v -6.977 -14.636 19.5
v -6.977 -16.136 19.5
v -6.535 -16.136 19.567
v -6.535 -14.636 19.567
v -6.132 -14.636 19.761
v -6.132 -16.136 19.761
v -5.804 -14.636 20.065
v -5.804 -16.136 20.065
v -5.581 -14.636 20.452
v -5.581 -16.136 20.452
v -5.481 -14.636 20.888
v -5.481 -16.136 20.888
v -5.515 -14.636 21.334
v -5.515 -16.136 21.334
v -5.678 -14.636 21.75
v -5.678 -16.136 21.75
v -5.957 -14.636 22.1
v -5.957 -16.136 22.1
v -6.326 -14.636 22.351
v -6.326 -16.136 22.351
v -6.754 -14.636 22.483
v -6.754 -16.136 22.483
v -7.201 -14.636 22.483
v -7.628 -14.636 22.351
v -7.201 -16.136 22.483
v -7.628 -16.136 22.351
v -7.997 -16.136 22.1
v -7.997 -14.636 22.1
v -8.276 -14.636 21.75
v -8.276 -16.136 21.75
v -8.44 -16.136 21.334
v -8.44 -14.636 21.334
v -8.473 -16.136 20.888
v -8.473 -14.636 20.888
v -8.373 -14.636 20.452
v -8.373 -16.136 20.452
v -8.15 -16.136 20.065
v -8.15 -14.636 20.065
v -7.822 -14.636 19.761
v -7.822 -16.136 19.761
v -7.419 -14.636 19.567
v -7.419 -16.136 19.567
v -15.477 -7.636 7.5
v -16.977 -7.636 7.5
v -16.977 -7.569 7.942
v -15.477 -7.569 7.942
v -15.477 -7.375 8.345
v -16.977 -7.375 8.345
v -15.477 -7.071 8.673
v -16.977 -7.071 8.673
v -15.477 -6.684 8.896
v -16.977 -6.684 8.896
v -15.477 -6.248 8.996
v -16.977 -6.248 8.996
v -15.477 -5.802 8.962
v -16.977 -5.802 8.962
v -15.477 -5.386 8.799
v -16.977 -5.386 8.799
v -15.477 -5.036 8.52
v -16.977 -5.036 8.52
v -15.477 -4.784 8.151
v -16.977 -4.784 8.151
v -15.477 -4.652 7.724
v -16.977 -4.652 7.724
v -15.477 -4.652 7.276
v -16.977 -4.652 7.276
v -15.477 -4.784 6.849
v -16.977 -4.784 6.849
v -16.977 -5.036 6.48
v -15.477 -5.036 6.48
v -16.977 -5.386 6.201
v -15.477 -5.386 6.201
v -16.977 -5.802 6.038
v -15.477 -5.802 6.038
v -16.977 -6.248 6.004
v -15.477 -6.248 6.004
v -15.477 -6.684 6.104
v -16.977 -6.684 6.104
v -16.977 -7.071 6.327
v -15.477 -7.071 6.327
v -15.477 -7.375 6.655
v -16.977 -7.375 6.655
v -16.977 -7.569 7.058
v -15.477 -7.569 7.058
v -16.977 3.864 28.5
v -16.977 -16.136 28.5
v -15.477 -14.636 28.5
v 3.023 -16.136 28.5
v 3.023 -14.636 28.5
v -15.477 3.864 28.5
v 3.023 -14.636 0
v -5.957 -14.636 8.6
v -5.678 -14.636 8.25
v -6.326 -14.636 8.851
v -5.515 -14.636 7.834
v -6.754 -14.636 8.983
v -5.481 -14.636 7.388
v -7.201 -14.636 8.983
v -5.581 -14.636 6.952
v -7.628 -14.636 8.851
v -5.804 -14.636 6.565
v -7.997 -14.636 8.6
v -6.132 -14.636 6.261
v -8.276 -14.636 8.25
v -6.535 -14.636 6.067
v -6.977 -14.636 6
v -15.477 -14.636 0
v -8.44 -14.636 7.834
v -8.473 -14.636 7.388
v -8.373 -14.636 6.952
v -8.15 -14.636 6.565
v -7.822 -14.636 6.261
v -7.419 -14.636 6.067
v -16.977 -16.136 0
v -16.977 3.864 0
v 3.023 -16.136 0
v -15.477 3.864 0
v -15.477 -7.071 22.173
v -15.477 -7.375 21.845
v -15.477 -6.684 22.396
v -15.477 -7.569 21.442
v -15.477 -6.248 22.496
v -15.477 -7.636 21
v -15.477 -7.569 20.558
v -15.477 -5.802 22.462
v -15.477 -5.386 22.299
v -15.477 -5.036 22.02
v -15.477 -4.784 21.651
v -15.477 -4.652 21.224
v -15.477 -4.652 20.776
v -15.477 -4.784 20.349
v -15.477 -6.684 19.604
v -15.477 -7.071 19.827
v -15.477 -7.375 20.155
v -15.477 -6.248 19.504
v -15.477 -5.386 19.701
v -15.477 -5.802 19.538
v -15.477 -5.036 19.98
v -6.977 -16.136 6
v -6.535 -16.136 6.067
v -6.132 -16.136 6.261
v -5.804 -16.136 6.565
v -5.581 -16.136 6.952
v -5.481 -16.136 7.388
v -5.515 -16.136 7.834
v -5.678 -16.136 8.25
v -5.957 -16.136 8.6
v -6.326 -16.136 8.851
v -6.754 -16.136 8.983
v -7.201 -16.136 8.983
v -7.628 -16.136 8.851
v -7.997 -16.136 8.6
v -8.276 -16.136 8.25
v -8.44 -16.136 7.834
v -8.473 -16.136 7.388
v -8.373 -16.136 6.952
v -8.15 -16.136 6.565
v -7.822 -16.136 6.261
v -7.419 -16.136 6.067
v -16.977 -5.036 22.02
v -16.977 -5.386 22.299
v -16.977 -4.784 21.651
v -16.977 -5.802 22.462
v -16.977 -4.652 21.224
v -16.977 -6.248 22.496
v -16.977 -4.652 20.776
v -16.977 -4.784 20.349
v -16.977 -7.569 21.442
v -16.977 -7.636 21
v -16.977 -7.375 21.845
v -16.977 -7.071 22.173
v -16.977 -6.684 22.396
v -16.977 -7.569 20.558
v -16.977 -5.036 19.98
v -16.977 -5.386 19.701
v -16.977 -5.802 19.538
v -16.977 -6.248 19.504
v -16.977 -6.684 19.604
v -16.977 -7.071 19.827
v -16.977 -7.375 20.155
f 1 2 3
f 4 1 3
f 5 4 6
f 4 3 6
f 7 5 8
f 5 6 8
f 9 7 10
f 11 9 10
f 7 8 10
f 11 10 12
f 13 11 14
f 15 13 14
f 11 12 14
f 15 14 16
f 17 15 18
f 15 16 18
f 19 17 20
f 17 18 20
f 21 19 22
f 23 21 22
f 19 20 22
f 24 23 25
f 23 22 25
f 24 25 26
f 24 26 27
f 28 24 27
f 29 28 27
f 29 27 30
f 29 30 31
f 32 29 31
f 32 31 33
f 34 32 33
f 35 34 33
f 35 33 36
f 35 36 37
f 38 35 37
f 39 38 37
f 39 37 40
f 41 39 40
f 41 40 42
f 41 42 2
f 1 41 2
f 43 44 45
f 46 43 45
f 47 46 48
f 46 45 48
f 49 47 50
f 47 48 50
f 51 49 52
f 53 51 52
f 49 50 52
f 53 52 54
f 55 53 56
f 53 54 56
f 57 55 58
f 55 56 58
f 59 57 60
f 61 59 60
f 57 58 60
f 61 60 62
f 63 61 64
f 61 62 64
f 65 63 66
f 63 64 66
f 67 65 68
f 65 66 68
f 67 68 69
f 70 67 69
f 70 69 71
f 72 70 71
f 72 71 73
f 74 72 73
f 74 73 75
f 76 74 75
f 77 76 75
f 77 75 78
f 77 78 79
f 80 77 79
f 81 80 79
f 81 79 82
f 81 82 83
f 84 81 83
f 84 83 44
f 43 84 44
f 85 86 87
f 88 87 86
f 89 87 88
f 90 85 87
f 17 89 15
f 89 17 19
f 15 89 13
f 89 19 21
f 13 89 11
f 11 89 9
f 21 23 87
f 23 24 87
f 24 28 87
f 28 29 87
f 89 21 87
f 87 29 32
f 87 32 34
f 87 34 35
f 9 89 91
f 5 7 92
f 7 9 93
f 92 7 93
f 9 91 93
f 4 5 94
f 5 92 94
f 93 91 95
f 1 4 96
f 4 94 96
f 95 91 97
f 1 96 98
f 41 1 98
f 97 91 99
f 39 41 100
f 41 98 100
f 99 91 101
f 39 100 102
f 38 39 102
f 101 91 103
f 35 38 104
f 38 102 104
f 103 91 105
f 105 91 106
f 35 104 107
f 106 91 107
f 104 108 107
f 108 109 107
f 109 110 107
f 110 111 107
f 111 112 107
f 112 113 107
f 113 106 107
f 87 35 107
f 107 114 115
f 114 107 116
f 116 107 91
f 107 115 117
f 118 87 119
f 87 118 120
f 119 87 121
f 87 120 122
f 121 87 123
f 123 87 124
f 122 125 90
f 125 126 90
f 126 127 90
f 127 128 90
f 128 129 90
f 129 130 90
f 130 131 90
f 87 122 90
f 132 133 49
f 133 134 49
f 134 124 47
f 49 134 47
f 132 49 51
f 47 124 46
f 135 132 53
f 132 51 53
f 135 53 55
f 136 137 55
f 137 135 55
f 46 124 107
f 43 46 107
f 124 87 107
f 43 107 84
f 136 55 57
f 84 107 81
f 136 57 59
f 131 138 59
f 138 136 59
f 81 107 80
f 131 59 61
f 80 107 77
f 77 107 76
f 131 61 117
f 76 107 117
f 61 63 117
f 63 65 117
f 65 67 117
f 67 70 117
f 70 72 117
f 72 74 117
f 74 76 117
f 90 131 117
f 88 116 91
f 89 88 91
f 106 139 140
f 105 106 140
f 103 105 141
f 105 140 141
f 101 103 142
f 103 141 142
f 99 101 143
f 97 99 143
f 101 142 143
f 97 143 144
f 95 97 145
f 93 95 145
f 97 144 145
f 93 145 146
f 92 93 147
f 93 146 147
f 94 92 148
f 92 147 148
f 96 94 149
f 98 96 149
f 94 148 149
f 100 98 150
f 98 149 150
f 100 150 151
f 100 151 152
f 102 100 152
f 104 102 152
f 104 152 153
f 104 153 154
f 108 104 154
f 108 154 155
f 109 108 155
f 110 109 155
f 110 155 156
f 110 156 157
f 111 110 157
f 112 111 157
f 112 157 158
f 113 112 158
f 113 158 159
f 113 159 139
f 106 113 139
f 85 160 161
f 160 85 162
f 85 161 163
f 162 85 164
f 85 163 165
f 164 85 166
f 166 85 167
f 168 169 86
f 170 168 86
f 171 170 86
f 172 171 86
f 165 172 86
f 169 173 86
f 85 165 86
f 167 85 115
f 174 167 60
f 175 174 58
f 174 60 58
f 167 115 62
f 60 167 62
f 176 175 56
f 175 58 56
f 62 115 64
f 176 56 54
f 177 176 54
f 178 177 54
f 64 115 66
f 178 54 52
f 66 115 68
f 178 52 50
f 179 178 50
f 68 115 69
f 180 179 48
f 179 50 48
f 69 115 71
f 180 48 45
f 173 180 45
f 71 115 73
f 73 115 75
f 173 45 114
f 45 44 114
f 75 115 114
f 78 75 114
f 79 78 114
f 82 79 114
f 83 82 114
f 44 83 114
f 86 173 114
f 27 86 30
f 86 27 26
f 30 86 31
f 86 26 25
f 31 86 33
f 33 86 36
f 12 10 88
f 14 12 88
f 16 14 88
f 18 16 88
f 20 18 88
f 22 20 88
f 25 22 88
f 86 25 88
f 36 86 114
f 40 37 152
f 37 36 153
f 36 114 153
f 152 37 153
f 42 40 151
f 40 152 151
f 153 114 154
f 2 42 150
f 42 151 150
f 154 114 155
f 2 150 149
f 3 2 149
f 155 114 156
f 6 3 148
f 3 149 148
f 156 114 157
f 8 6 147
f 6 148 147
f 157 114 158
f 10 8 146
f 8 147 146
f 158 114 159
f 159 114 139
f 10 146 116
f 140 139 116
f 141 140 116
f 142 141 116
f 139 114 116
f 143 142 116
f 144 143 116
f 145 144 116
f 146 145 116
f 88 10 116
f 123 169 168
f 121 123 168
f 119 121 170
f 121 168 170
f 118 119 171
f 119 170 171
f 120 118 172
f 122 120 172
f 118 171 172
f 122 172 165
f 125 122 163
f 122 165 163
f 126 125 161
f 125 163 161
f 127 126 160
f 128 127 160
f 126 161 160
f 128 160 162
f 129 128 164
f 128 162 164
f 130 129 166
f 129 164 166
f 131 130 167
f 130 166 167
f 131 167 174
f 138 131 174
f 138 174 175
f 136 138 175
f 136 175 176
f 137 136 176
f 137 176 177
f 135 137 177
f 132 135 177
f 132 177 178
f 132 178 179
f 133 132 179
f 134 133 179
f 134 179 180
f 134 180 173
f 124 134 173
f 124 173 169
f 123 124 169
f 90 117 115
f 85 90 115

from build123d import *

# Parameters (mm, degrees)
EXTRUSION1_DEPTH = 28.5
ESQUISSE2_R      = 1.5
EXTRUSION2_DEPTH = 47.5
ESQUISSE3_R      = 1.5
EXTRUSION3_DEPTH = 10


with BuildPart() as part:
    # Esquisse1 → Extrusion1 (new body)
    with BuildSketch(Plane.XY):
        Polygon((-16.977160064, 3.864315789), (-16.977160064, -16.135684211), (3.022839936, -16.135684211), (3.022839936, -14.635684211), (-15.477160064, -14.635684211), (-15.477160064, 3.864315789), align=None)
    extrude(amount=EXTRUSION1_DEPTH)

    # Esquisse2 → Extrusion2 (cut)
    with BuildSketch(Plane.ZY.offset(16.977160064)):
        with Locations(Location((21, -6.135684211, 0), (0, 0, 270))):
            Circle(ESQUISSE2_R)
        with Locations(Location((7.5, -6.135684211, 0), (0, 0, 270))):
            Circle(ESQUISSE2_R)
    extrude(amount=-EXTRUSION2_DEPTH, mode=Mode.SUBTRACT)

    # Esquisse3 → Extrusion3 (cut)
    with BuildSketch(Plane.XZ.offset(16.135684211)):
        with Locations(Location((-6.977160064, 7.5, 0), (0, 0, 270))):
            Circle(ESQUISSE3_R)
        with Locations(Location((-6.977160064, 21, 0), (0, 0, 270))):
            Circle(ESQUISSE3_R)
    extrude(amount=-EXTRUSION3_DEPTH, mode=Mode.SUBTRACT)


solid = part.part
